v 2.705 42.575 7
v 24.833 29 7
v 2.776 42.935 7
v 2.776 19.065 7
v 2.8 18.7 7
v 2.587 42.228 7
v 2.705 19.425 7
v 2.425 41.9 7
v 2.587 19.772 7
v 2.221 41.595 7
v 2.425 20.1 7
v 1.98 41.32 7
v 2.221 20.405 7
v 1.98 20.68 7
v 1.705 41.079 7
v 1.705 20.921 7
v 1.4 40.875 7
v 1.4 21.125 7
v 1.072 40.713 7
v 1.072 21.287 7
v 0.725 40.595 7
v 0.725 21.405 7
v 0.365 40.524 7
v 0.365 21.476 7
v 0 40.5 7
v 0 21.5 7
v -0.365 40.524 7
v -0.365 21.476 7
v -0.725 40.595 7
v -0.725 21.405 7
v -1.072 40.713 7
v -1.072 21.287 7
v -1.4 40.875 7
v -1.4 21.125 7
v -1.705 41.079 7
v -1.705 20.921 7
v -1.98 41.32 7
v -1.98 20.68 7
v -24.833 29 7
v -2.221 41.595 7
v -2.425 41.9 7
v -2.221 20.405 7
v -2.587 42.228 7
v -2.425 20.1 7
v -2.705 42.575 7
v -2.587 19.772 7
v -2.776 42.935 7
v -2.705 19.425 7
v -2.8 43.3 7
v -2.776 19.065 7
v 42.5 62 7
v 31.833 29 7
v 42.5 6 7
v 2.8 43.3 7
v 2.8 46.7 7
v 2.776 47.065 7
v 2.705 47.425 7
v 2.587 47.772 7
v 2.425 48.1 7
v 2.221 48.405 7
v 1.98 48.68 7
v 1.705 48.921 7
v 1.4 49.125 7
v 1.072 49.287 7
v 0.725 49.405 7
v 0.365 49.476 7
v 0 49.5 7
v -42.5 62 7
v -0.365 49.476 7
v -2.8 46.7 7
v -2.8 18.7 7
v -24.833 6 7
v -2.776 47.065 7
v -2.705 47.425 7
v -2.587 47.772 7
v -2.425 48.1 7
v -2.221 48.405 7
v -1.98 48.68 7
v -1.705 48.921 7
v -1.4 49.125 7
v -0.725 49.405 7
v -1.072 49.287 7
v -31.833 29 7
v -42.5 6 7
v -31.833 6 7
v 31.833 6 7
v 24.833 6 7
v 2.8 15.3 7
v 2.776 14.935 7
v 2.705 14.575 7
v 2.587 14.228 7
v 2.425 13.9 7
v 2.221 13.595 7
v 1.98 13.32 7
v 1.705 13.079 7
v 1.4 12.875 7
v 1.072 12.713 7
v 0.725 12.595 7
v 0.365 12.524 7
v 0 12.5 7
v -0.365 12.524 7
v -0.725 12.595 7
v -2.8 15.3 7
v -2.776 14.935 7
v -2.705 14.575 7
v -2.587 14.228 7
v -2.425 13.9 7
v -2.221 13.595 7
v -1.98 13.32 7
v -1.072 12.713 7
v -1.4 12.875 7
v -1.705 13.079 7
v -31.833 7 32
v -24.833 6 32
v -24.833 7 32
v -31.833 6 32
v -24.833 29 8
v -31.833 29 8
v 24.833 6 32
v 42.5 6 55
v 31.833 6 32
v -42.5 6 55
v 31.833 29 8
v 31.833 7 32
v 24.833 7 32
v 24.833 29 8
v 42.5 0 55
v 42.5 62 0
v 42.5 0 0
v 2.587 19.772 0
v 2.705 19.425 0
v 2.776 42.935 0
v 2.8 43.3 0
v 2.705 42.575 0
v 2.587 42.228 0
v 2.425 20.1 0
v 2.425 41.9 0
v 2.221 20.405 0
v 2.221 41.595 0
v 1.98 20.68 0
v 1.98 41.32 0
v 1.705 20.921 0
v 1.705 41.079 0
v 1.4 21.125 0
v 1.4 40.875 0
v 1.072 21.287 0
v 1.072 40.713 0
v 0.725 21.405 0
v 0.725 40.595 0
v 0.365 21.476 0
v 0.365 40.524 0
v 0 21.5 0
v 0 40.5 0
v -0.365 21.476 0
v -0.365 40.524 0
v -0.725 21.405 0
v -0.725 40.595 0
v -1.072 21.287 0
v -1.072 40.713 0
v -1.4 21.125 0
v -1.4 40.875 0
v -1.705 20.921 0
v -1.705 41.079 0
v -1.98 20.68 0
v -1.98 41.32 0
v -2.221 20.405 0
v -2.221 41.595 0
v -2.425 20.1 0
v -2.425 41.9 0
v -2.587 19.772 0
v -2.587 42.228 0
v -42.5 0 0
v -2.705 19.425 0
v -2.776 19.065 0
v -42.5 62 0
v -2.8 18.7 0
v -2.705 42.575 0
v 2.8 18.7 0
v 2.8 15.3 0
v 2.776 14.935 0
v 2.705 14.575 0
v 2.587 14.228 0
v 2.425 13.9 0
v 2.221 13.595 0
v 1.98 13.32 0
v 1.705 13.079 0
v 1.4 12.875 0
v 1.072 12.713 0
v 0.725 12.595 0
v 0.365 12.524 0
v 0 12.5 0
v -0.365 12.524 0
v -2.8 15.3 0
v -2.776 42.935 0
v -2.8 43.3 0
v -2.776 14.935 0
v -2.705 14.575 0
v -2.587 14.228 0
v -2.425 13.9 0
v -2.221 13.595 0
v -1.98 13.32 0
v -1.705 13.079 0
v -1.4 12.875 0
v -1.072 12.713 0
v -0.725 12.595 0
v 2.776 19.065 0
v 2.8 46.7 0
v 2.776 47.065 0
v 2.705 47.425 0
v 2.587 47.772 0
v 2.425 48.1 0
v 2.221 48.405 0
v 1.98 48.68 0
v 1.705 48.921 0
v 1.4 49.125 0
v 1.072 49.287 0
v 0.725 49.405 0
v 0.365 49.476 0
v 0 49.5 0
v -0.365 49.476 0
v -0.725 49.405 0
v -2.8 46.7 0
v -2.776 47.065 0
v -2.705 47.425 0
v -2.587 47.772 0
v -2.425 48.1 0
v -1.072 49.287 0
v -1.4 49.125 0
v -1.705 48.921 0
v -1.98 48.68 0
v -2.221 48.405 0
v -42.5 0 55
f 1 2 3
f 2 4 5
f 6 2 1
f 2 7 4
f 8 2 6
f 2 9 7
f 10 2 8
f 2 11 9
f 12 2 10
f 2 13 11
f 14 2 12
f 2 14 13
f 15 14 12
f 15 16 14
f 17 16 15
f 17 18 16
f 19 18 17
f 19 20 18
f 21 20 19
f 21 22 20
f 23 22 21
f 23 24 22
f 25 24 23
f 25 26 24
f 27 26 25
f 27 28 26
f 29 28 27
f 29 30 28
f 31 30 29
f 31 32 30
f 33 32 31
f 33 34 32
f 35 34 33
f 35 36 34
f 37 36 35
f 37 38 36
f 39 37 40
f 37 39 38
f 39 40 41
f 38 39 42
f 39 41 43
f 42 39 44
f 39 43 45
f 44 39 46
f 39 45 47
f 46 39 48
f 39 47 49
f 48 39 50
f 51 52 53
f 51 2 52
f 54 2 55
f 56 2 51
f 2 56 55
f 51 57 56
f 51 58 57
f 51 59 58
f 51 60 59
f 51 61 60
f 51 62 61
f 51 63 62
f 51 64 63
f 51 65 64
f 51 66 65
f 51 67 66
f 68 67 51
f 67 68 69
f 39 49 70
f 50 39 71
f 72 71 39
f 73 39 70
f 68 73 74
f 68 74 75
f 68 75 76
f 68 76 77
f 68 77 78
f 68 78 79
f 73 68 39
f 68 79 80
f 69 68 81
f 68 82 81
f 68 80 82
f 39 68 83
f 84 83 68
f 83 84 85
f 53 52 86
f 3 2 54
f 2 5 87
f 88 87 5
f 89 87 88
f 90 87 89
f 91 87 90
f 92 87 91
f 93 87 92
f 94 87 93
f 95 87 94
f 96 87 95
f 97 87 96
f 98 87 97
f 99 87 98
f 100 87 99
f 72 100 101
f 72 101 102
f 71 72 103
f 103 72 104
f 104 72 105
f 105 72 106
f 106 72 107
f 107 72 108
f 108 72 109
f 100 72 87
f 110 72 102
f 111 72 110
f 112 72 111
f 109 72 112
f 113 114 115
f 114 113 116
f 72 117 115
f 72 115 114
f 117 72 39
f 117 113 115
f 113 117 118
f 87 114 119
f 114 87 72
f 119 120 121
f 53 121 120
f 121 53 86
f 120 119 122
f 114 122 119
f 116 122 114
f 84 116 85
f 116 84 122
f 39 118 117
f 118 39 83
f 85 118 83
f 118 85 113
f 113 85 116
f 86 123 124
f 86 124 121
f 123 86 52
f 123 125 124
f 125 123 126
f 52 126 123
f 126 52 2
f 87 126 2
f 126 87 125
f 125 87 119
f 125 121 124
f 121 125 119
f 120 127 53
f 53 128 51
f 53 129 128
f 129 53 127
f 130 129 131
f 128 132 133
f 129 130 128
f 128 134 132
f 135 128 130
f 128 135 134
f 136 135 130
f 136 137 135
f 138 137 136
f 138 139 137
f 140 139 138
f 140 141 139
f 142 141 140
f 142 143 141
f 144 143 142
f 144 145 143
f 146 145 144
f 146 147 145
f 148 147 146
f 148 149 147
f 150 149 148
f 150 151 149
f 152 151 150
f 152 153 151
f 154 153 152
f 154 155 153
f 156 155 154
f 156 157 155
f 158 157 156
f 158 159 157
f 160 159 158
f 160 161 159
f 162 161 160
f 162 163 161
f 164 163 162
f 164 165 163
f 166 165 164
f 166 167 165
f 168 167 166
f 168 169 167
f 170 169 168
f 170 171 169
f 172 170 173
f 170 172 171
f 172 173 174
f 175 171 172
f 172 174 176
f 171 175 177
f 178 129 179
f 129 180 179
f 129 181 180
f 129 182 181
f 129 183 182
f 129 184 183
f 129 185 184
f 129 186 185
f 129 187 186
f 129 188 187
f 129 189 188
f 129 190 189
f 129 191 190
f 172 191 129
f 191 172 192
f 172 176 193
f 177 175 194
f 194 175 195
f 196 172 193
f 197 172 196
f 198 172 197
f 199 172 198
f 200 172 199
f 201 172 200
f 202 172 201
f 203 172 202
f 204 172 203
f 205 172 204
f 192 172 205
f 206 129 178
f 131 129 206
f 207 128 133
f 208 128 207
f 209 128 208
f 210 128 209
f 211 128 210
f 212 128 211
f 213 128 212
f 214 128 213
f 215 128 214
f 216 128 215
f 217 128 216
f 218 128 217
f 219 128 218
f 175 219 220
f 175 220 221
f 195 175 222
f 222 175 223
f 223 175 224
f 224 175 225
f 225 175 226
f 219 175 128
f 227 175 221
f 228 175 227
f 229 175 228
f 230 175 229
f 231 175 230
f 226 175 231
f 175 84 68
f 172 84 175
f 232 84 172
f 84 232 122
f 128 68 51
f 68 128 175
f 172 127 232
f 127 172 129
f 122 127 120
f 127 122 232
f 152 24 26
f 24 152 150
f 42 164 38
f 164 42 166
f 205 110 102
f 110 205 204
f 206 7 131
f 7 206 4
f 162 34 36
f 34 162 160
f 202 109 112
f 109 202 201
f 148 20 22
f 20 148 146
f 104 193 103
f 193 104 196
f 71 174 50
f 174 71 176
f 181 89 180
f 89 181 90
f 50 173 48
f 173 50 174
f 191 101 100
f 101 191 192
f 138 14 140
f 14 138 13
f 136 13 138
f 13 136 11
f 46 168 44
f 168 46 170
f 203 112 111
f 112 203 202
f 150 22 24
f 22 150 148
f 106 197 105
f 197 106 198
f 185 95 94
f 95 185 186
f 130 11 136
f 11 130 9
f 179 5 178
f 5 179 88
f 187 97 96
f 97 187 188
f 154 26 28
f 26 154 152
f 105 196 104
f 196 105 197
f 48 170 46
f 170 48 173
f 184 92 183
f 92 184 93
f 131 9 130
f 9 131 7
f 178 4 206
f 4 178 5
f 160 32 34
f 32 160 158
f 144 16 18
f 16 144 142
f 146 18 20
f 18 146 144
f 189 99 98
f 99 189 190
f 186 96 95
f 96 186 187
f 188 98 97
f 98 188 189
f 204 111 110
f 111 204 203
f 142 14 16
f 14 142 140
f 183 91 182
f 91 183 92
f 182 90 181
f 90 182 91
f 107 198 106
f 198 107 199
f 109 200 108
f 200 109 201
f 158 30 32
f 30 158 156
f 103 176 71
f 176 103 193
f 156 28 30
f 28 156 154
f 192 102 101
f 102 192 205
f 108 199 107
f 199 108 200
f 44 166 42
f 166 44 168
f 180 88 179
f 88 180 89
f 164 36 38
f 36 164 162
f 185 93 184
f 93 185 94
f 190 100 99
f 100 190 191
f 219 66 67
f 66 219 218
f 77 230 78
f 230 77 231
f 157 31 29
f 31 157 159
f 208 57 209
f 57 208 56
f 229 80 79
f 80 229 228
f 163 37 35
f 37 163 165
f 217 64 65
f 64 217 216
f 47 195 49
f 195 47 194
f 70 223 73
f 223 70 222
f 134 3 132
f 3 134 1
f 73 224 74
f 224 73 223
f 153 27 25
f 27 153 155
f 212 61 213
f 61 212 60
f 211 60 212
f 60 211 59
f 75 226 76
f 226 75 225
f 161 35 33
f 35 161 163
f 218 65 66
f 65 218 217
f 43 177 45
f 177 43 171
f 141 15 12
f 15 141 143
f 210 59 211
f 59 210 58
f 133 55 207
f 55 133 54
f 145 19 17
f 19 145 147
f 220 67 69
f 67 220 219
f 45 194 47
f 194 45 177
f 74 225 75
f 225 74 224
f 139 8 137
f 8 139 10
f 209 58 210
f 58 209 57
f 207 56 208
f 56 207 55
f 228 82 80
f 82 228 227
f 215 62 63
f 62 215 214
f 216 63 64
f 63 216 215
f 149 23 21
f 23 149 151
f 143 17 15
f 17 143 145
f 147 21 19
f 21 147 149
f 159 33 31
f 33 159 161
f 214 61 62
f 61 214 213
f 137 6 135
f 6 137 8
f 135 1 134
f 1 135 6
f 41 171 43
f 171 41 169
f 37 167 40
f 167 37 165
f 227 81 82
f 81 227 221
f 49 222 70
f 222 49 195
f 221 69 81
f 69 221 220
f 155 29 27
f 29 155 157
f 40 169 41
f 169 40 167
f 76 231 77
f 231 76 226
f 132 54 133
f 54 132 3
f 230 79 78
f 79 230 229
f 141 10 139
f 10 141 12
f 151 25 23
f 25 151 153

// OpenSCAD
// Webcam clip adapter for a 2020 T-slot extrusion boom.
// Defaults are an unmeasured test fit. Set the dimensions after measuring the
// webcam's folding clip and checking the boom position over the keyboard.

plate_width = 85;       // width of the flat edge held by the webcam clip
plate_height = 48;      // exposed vertical height above the base
plate_thickness = 6;    // thickness the webcam clip grips
base_depth = 62;        // room for 2020 extrusion attachment behind plate
base_thickness = 7;
bolt_spacing = 28;      // two M5 T-nuts along the extrusion slot
slot_length = 9;        // adjustment parallel to the extrusion
bolt_clearance = 5.6;
rib_width = 7;

$fn = 48;

assert(plate_width >= 50);
assert(plate_thickness >= 4);
assert(base_depth > bolt_spacing + slot_length + 10);

module oblong_hole(length, diameter, height) {
    hull() {
        translate([0, -length / 2 + diameter / 2, 0])
            cylinder(h = height, d = diameter);
        translate([0, length / 2 - diameter / 2, 0])
            cylinder(h = height, d = diameter);
    }
}

difference() {
    union() {
        // Base sits against the underside of the extrusion. The webcam clips
        // over the top edge of the upright at the front of the base.
        translate([-plate_width / 2, 0, 0])
            cube([plate_width, base_depth, base_thickness]);
        translate([-plate_width / 2, 0, 0])
            cube([plate_width, plate_thickness, base_thickness + plate_height]);

        // Triangular buttresses reduce bending at the upright/base joint.
        for (x = [-plate_width / 3, plate_width / 3]) {
            hull() {
                translate([x - rib_width / 2, plate_thickness, base_thickness])
                    cube([rib_width, 1, 25]);
                translate([x - rib_width / 2, 28, base_thickness])
                    cube([rib_width, 1, 1]);
            }
        }
    }

    // M5 screws go upward into two T-nuts in one extrusion slot.
    for (y = [base_depth / 2 - bolt_spacing / 2,
              base_depth / 2 + bolt_spacing / 2]) {
        translate([0, y, -1])
            oblong_hole(slot_length, bolt_clearance, base_thickness + 2);
    }
}
